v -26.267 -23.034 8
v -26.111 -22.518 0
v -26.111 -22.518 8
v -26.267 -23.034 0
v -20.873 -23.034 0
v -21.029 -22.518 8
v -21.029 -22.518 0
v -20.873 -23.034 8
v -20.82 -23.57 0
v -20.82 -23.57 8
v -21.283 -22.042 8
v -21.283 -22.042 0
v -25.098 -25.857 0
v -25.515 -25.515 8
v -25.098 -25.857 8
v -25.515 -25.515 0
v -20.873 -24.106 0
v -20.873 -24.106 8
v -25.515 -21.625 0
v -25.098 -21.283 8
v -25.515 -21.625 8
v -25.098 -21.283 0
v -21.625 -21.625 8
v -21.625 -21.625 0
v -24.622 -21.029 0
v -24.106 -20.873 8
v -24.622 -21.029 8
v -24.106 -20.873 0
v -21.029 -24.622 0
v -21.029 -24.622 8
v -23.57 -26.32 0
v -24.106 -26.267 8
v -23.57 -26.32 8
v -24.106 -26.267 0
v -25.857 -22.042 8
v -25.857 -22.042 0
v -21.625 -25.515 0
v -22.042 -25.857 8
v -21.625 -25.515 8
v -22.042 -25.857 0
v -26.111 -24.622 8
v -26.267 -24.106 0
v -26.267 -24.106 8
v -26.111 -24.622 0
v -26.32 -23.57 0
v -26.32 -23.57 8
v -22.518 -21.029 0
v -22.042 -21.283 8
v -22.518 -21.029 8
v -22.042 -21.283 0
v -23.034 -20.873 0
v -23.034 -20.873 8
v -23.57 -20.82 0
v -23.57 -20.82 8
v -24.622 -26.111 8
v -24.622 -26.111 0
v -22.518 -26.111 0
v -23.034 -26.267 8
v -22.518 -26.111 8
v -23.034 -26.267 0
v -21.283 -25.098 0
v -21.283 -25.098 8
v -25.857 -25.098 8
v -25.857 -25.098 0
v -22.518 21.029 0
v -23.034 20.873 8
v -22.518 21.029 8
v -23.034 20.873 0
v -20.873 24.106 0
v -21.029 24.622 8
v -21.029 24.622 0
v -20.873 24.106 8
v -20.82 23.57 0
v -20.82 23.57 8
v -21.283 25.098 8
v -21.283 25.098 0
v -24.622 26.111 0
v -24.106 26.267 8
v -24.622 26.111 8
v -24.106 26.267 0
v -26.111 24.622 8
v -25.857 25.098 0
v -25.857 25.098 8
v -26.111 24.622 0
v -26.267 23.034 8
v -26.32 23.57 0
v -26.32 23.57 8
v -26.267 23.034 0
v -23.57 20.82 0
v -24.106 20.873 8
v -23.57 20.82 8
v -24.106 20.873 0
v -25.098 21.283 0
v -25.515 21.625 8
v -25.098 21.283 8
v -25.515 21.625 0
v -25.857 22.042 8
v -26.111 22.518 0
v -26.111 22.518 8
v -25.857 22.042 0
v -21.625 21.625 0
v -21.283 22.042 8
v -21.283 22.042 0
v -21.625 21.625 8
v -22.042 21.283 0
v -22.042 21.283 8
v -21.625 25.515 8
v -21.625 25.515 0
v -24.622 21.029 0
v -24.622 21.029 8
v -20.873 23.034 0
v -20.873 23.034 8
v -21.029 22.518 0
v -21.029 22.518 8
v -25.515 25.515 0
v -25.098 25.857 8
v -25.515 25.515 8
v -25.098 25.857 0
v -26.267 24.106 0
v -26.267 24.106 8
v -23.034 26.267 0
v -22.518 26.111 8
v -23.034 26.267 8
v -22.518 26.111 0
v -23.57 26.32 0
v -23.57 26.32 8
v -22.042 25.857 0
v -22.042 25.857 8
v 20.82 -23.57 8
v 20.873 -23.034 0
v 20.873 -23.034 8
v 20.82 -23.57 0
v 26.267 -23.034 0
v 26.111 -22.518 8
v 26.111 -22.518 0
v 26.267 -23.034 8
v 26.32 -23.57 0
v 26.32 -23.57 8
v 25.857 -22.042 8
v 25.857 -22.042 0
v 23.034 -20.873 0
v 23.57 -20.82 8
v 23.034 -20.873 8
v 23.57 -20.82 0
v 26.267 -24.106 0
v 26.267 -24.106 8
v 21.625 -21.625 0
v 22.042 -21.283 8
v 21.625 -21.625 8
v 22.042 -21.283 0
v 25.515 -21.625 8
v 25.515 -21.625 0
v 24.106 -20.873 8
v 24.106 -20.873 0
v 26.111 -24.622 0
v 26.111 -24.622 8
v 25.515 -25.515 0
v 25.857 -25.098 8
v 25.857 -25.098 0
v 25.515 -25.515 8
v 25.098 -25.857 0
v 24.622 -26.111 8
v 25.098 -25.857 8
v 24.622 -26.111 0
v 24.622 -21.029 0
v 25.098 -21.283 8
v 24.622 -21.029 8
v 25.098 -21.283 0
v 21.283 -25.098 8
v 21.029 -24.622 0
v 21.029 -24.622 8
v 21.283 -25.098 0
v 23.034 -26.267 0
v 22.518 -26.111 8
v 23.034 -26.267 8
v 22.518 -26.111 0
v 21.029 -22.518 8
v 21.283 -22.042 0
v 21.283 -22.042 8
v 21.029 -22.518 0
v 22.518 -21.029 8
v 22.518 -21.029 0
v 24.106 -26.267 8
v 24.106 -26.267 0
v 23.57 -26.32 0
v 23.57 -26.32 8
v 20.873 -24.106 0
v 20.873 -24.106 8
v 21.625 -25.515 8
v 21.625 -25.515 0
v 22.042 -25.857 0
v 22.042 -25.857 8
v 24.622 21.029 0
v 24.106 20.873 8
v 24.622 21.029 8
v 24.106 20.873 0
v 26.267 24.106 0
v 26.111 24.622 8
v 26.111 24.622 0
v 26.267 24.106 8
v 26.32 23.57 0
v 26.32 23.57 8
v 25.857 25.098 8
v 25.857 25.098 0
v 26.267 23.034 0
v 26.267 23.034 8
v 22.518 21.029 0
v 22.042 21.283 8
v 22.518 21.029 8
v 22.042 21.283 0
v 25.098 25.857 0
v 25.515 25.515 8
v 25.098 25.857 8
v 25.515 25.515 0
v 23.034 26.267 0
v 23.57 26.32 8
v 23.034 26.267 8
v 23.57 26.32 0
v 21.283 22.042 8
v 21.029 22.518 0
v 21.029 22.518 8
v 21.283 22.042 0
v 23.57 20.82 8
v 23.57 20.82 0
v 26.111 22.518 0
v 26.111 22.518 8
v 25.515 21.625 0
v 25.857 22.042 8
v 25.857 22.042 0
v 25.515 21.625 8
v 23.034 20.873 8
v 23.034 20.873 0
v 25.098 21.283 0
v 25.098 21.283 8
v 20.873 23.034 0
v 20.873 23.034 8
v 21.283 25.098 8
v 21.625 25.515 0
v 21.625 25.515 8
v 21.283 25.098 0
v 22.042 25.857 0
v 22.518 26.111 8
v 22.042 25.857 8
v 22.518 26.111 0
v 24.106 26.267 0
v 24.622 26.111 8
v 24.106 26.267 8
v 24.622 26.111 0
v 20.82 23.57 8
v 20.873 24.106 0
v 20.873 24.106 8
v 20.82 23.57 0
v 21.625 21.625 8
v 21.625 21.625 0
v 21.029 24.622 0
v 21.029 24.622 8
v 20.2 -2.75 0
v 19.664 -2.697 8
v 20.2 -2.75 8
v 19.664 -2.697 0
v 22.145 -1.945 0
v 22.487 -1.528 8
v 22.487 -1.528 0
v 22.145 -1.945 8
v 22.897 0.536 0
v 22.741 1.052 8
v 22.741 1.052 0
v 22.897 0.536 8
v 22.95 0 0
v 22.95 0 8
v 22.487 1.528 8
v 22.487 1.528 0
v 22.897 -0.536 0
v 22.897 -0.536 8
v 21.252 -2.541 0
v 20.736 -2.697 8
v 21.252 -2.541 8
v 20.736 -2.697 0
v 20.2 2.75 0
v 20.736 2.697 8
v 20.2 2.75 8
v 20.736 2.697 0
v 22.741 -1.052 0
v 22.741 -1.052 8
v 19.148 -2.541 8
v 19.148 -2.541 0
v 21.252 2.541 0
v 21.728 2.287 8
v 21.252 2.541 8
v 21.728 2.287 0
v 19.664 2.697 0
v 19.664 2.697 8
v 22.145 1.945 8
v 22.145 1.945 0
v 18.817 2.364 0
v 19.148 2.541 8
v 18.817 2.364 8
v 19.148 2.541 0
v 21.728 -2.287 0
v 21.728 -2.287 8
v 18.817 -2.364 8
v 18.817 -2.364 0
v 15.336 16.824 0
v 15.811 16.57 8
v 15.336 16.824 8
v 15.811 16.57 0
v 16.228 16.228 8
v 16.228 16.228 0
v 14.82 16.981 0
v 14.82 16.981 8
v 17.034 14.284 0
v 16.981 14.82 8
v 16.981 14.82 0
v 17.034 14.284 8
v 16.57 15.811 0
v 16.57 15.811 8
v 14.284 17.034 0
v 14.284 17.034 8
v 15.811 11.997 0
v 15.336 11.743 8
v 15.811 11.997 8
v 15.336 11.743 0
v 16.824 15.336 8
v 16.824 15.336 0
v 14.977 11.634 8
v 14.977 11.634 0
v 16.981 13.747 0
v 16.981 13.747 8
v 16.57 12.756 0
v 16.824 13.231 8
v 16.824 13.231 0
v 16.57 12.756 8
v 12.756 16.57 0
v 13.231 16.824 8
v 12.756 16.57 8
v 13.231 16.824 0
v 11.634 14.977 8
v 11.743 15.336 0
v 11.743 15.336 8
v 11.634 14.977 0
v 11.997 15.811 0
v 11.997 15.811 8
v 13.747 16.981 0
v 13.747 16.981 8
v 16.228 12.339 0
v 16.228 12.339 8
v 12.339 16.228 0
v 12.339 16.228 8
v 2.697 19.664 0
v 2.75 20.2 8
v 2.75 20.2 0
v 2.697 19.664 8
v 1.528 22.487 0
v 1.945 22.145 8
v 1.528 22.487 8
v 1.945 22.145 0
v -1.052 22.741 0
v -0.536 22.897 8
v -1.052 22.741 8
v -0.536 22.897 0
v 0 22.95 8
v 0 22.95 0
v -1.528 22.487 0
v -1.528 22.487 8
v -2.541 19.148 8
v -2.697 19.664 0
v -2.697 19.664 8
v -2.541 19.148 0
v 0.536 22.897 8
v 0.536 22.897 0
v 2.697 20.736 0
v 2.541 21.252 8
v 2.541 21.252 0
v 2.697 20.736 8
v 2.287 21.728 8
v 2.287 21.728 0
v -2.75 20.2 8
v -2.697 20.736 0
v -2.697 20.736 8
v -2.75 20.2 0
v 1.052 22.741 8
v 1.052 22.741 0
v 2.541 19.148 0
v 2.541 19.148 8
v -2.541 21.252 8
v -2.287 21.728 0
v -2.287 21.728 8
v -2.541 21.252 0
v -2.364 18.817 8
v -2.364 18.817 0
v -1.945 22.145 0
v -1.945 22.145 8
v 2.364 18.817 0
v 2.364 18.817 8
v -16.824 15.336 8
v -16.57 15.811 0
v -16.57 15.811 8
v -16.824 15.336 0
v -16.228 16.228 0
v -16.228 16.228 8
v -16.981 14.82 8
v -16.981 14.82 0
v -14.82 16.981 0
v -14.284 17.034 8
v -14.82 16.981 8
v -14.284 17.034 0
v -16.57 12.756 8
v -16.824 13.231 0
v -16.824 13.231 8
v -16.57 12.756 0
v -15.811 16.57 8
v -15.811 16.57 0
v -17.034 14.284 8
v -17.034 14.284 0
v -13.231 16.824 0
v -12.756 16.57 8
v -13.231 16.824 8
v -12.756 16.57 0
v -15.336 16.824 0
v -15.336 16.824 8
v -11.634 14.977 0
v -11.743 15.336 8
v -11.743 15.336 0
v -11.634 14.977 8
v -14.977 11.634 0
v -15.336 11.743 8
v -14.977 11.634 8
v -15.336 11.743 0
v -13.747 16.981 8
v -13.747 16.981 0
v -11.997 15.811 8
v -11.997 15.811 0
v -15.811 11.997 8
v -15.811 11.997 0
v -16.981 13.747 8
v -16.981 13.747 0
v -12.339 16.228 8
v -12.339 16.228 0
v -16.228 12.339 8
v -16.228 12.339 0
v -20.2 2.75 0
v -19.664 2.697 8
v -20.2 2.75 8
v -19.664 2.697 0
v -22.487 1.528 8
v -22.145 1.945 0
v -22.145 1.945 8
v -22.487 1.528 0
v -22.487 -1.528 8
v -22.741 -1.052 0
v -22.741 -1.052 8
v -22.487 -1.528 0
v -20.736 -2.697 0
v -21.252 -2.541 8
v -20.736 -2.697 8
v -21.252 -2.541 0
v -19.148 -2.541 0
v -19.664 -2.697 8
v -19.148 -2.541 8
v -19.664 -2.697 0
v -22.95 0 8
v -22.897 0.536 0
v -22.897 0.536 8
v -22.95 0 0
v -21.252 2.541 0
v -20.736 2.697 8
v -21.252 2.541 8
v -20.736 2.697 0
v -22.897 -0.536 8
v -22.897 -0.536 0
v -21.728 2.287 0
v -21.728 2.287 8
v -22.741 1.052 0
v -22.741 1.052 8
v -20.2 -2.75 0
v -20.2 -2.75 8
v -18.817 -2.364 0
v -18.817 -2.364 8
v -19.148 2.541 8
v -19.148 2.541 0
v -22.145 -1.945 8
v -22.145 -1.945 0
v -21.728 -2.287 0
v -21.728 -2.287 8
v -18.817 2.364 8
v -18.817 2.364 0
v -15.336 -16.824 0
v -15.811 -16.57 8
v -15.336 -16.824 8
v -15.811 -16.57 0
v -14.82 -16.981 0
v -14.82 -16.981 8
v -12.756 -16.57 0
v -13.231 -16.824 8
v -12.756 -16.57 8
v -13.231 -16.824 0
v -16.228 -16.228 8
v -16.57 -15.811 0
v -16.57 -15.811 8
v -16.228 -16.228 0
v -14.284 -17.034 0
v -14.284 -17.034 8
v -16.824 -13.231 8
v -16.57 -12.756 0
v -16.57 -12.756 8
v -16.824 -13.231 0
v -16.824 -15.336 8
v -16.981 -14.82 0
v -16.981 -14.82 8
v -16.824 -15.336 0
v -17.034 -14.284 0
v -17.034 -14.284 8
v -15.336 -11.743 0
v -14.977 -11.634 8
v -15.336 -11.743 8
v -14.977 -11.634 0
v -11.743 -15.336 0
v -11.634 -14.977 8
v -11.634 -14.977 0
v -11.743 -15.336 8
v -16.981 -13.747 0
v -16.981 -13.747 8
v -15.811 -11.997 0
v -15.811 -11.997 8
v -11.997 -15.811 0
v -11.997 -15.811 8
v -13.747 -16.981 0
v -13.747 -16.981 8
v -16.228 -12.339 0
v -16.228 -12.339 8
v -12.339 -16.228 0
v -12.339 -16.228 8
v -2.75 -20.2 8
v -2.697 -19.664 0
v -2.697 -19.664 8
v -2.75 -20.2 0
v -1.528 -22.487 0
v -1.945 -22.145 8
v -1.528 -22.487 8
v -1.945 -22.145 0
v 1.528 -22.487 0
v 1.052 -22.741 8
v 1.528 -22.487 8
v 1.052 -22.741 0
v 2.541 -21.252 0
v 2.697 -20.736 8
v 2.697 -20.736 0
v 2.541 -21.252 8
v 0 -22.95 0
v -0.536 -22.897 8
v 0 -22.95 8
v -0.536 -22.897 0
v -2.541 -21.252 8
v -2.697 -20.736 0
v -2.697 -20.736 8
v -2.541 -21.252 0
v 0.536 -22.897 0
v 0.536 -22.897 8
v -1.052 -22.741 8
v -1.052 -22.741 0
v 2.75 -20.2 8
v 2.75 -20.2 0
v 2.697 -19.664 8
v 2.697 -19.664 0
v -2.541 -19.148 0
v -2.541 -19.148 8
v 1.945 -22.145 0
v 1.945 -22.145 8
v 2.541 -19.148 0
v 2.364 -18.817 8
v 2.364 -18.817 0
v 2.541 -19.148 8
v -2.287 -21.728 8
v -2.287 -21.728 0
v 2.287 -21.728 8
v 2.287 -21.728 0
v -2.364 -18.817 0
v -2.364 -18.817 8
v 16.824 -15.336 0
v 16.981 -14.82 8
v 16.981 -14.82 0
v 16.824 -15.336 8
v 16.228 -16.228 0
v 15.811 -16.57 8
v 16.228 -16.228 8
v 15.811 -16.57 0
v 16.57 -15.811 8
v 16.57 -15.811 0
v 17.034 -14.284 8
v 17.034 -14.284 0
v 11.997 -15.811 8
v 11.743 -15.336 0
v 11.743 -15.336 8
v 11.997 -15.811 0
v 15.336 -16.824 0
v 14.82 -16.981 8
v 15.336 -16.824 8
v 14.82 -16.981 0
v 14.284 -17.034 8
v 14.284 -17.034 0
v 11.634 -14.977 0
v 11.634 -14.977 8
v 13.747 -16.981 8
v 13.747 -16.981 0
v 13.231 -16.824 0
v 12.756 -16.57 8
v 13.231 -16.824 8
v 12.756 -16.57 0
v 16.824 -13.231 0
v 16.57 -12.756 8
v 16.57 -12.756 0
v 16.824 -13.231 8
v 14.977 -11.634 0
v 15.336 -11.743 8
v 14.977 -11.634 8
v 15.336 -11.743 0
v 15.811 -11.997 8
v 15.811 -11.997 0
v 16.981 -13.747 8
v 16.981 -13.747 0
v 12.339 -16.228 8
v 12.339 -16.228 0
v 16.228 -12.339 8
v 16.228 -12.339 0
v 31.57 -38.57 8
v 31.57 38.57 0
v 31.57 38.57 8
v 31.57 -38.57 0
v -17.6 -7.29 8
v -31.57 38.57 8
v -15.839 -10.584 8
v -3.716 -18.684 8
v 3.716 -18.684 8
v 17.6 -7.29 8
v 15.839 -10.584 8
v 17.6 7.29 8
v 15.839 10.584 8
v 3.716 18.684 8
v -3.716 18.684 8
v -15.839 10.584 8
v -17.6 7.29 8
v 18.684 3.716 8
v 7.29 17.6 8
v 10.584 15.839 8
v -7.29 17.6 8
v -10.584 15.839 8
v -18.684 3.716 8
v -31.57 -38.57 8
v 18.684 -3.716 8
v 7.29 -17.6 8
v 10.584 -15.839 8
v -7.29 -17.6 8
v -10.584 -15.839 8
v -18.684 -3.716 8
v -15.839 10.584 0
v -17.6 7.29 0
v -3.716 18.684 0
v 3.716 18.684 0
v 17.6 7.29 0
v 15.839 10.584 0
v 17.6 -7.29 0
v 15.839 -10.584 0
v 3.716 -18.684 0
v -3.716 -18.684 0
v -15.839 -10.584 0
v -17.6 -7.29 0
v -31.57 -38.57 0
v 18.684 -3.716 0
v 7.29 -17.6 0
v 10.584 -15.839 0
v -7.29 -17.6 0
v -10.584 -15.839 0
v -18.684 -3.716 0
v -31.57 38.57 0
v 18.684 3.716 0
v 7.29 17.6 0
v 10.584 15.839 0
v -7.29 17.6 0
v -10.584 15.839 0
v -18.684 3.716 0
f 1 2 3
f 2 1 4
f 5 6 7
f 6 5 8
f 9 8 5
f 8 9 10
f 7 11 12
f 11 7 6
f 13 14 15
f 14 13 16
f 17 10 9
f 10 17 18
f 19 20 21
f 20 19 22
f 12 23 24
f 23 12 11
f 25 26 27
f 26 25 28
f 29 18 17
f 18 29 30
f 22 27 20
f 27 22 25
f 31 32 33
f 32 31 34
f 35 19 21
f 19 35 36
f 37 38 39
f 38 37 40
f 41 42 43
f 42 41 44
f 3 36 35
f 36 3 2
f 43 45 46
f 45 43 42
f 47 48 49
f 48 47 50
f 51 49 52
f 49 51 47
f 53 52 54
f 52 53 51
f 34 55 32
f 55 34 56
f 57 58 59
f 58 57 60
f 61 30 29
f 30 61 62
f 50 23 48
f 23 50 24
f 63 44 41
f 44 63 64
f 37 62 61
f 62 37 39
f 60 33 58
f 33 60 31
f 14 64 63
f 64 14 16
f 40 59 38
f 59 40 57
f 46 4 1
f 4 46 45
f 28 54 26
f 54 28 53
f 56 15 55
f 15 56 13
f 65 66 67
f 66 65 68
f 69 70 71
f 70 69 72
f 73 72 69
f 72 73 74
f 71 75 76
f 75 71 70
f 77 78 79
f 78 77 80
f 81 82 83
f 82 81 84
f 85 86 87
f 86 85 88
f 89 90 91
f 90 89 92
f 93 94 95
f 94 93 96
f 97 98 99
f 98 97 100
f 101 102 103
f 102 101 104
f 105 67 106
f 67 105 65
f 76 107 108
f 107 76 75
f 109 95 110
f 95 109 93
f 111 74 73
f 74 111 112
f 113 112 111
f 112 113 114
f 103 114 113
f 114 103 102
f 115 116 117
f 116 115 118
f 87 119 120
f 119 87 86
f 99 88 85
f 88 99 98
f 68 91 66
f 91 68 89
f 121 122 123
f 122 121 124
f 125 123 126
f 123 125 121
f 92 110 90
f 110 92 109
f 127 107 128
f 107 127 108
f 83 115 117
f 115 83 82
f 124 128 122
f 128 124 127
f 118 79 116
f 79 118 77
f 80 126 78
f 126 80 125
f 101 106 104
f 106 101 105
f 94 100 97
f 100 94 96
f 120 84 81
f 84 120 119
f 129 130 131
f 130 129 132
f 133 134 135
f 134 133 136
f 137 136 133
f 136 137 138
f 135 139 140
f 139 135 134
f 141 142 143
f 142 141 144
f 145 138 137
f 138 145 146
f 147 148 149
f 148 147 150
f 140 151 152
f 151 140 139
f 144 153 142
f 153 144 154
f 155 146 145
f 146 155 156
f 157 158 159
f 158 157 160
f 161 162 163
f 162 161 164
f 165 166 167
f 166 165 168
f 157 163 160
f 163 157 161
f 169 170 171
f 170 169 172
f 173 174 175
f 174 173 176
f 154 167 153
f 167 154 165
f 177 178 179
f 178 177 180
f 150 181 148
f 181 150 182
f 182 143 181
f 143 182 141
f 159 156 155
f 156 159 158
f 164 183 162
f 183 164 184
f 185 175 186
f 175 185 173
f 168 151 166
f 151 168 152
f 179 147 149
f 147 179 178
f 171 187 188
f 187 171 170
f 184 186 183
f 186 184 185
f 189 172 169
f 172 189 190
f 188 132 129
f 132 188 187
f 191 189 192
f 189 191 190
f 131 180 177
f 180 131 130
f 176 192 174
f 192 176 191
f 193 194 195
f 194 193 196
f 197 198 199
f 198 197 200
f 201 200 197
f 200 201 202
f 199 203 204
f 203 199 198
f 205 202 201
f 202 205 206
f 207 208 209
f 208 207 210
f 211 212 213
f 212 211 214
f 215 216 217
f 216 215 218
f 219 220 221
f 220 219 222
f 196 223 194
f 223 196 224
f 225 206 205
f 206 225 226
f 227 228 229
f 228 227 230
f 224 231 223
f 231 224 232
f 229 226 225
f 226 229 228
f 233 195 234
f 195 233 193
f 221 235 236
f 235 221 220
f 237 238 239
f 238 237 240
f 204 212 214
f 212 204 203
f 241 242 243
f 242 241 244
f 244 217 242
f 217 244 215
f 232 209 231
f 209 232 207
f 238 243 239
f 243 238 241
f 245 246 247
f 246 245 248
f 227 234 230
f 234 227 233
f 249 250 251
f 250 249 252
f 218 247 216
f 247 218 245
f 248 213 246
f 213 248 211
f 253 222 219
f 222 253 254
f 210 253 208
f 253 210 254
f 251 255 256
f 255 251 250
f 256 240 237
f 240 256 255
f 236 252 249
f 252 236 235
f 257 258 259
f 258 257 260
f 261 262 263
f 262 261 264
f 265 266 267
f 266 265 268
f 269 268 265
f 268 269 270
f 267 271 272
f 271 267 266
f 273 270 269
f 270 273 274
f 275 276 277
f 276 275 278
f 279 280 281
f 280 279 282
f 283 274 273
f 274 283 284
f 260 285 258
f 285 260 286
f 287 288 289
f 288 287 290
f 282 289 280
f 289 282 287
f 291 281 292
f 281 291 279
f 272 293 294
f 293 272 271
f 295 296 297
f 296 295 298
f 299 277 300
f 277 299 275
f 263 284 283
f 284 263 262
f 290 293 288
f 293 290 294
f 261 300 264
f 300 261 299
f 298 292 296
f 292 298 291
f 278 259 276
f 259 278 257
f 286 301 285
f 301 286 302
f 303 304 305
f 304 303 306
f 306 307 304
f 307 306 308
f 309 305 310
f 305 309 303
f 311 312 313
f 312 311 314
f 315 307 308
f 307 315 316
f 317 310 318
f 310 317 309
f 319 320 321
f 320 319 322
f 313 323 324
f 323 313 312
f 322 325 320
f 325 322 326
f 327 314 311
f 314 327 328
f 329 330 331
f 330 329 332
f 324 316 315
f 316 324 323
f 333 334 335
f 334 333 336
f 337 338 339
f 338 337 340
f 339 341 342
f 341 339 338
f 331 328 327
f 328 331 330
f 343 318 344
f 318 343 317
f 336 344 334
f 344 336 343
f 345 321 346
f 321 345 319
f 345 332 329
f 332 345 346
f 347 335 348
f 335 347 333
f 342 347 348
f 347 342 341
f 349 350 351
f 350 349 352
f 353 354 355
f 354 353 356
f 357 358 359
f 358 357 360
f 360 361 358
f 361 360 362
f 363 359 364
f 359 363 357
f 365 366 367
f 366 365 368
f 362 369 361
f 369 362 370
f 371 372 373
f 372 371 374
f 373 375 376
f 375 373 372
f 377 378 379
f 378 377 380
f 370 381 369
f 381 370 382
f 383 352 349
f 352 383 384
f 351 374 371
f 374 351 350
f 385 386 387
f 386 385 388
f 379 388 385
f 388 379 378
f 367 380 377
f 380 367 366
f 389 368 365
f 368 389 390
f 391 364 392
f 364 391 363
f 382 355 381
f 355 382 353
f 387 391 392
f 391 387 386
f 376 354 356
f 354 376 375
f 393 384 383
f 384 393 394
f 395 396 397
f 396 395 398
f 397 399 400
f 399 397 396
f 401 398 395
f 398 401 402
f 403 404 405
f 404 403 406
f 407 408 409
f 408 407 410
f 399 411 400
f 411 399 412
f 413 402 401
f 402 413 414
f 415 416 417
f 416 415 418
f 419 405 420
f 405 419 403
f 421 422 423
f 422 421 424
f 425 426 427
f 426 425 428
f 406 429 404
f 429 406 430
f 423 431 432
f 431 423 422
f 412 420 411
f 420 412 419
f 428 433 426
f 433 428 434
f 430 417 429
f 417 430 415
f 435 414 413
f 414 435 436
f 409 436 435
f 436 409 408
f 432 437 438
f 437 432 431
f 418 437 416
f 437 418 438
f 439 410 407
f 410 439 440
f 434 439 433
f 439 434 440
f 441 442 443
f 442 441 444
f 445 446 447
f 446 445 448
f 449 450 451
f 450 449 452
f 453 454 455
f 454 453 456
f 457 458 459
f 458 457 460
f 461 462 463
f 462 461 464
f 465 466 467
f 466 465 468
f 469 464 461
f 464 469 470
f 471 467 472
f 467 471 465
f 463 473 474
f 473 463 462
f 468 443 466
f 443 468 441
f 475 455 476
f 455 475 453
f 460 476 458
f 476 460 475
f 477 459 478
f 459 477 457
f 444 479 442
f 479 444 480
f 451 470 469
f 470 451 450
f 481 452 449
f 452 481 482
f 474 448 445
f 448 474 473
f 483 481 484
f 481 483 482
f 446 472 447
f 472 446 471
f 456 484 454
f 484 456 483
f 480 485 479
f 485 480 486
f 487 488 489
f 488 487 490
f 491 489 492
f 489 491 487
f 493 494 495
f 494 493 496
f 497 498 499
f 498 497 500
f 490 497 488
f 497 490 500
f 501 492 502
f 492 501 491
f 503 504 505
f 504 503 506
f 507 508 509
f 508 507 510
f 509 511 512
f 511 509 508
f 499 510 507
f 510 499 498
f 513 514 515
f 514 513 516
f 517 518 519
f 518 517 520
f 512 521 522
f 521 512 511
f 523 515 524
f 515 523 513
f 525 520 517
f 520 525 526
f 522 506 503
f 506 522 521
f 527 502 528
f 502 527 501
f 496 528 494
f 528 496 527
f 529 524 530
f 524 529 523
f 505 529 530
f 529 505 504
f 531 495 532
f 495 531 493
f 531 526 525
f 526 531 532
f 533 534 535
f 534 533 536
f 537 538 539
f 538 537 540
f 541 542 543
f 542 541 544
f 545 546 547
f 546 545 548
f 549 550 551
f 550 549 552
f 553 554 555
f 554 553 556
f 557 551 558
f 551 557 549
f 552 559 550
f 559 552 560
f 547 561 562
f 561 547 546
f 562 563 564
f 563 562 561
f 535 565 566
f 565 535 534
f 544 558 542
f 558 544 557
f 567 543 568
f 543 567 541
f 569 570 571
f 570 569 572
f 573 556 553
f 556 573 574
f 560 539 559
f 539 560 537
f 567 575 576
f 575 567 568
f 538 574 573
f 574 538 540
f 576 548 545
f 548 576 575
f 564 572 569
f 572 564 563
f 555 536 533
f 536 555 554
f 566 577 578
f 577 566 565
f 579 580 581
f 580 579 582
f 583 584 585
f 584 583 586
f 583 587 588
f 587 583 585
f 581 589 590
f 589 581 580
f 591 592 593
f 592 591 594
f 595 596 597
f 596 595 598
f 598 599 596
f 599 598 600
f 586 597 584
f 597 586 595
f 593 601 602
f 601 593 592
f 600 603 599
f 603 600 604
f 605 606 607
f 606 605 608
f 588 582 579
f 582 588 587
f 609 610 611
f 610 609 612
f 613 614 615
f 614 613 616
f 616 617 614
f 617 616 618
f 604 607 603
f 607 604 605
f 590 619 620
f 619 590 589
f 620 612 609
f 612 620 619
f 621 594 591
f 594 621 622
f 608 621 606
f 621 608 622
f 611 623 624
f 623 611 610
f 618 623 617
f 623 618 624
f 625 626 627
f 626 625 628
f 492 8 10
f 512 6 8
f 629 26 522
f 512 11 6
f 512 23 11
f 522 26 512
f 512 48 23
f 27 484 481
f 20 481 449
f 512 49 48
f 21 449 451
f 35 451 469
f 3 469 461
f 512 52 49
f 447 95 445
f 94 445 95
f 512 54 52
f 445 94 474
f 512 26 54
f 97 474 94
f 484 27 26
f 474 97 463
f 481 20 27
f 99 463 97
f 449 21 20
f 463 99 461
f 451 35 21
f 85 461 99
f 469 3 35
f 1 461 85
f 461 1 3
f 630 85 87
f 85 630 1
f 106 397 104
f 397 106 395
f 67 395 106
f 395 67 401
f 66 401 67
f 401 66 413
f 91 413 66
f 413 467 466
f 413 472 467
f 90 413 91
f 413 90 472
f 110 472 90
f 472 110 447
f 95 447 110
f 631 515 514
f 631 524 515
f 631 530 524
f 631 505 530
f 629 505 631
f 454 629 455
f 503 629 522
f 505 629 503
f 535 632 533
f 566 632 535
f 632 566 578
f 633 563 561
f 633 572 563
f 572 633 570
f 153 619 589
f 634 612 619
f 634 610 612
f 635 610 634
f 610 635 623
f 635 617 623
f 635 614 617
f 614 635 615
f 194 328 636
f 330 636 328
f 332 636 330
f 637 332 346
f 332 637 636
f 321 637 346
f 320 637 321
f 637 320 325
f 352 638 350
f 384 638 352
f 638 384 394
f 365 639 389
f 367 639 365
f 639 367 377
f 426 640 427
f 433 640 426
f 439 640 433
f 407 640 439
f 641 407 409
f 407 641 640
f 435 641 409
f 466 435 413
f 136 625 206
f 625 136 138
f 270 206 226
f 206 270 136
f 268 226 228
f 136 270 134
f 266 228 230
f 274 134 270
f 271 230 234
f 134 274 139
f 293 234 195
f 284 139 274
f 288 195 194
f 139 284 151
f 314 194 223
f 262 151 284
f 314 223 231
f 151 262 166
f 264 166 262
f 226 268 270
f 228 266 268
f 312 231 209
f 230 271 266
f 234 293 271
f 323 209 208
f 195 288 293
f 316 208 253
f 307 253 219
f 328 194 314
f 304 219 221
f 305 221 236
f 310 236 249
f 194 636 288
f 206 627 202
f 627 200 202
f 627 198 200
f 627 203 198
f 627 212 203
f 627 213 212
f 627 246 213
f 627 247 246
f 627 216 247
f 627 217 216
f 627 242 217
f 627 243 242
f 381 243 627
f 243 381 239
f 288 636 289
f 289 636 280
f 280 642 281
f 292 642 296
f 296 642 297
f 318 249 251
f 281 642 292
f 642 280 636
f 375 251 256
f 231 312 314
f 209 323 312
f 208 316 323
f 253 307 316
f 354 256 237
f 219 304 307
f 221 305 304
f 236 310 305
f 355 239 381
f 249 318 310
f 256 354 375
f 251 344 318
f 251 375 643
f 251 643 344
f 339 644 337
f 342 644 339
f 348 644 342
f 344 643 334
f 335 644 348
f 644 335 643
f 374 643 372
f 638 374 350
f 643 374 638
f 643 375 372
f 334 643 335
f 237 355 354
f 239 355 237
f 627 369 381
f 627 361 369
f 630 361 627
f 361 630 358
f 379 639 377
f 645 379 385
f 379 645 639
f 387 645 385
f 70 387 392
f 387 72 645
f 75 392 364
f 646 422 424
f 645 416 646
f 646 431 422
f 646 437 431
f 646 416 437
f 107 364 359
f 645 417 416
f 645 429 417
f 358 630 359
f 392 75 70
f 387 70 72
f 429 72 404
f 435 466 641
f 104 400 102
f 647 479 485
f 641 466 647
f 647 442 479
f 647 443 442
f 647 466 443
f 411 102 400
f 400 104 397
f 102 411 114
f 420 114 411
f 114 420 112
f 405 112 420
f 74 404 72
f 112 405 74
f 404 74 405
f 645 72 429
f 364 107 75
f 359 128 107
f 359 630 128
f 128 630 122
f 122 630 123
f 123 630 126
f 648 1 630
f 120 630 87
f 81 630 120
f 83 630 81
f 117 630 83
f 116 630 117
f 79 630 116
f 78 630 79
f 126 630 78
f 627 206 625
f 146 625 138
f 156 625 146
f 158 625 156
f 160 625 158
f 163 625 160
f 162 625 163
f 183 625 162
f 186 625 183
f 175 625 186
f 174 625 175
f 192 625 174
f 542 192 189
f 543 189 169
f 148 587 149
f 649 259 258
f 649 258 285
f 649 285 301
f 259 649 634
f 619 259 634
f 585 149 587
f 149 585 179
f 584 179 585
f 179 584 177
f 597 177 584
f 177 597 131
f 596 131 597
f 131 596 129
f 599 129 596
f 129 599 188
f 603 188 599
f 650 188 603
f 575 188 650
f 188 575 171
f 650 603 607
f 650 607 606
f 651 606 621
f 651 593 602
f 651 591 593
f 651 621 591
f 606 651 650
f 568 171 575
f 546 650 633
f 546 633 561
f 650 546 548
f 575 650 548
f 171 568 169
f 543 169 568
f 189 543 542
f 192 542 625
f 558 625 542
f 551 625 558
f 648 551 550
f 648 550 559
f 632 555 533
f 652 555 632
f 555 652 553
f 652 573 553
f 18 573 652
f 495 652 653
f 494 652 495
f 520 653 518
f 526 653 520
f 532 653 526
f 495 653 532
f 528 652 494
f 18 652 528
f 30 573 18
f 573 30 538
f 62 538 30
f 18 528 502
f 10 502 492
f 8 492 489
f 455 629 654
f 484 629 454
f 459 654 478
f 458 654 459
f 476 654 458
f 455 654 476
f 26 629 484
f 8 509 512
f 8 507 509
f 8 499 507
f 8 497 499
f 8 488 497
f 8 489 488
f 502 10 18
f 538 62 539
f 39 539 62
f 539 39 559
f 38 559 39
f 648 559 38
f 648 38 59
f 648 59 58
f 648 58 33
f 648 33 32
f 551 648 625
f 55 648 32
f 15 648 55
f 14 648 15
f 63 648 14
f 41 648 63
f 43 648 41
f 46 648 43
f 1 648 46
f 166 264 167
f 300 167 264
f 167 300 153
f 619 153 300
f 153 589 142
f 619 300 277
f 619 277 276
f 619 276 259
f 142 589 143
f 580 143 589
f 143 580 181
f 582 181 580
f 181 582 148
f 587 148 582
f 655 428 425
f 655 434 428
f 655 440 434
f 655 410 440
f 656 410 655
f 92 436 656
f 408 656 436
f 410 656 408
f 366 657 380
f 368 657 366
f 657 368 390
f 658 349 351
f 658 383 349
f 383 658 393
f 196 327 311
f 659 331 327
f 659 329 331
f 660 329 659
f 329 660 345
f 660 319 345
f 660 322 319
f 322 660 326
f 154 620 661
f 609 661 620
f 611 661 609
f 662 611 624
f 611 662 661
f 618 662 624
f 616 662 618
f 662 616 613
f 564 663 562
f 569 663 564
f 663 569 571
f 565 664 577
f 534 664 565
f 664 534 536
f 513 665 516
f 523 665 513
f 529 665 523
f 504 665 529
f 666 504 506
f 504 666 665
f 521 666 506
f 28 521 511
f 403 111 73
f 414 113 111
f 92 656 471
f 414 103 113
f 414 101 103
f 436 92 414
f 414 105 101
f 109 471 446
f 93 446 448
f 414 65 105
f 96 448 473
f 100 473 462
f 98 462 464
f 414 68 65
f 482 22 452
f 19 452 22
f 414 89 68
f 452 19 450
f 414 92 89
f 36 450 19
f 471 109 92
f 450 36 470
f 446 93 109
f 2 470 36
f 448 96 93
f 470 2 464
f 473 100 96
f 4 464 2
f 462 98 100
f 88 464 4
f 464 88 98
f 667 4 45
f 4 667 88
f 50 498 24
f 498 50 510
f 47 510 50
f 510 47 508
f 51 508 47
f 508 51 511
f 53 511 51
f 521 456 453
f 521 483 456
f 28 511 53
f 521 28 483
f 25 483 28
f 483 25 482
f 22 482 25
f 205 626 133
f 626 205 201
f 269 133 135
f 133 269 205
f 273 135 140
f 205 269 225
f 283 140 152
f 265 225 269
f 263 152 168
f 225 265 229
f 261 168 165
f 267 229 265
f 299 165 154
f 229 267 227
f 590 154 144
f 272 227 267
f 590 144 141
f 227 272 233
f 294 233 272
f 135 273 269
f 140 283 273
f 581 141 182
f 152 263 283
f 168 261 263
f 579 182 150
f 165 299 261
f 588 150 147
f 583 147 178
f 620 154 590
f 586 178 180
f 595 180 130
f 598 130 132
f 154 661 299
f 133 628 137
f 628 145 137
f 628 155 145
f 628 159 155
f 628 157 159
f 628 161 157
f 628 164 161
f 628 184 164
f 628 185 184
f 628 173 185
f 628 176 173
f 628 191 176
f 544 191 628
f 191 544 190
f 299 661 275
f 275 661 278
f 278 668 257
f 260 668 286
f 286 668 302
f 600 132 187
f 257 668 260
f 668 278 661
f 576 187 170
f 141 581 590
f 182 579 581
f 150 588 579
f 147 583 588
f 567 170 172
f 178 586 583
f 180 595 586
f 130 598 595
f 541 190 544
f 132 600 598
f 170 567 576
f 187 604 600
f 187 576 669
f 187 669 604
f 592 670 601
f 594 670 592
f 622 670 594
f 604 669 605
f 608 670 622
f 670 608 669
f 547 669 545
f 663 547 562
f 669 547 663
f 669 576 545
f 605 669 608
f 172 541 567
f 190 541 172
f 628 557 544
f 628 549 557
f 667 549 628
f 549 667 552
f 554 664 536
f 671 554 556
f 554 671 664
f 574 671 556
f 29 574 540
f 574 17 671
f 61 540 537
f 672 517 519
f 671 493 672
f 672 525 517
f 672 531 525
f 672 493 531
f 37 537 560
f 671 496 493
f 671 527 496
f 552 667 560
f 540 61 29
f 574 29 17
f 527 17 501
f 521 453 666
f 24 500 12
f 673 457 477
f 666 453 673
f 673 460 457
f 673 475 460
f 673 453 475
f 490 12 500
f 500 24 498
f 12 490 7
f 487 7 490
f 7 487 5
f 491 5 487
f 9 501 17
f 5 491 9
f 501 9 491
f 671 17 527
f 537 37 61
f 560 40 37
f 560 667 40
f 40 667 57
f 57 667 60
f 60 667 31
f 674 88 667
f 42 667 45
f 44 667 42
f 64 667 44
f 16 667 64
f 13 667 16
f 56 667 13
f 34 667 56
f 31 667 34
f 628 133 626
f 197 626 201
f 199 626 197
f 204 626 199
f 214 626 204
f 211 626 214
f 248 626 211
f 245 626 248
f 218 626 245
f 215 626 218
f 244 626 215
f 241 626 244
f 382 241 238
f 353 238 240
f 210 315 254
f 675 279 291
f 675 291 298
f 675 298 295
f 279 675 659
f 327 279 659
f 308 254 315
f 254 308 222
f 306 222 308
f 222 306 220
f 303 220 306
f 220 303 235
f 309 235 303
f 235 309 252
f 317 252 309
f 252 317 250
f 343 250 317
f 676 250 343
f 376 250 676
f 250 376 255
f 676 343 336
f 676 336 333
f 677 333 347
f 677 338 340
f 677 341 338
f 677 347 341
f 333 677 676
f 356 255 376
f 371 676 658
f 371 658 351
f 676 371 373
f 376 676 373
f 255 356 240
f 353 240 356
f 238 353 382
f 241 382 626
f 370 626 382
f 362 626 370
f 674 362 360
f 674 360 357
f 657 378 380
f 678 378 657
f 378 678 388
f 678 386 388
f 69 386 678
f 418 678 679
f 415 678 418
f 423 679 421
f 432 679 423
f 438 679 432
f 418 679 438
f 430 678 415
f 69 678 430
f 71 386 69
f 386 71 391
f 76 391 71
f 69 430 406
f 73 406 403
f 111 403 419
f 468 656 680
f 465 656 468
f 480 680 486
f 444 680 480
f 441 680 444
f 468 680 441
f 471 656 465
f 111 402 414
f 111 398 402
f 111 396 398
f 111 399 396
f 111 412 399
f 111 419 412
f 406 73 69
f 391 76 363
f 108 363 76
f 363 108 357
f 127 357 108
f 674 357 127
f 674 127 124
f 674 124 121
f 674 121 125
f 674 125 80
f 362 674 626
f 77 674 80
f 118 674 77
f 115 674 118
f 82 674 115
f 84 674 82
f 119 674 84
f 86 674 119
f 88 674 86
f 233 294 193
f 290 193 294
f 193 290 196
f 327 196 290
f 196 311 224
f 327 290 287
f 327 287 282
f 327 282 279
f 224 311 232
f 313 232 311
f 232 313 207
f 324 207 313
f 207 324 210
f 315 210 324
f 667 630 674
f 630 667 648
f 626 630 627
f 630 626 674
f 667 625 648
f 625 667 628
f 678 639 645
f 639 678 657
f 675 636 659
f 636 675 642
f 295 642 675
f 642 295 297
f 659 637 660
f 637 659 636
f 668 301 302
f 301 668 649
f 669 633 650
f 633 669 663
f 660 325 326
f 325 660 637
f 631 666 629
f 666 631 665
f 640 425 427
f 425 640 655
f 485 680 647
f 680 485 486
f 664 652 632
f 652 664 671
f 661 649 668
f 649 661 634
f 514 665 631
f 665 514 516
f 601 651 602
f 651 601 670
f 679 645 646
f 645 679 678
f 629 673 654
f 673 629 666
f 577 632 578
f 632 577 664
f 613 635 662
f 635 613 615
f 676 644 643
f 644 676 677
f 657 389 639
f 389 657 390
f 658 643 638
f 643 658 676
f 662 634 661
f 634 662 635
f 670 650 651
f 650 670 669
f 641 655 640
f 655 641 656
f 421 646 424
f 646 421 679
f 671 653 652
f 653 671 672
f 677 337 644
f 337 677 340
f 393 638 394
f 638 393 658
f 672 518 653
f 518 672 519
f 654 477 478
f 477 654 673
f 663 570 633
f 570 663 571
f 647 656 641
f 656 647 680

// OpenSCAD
$fn = 32;

// ----------------------------------------------------------------------
// Motor mount plate: NEMA23, 63.14 x 77.14 x 8 mm
// ----------------------------------------------------------------------

// --- parameters (mm) ---
mount_w = 63.14;          // plate length, X
mount_d = 77.14;          // plate width, Y
mat_t = 8;                // plate thickness
motor_pitch = 47.14;      // NEMA23 bolt spacing
motor_d = 5.5;            // NEMA23 screw clearance
center_bore = 38.1;       // pilot boss bore
second_d = 5.5;           // second fastener hole
bc_r = 20.2;              // second bolt circle radius
bc_n = 8;                 // second bolt circle count

module plate() {
  translate([-mount_w / 2, -mount_d / 2, 0]) cube([mount_w, mount_d, mat_t]);
}

module motor_holes() {
  for (sx = [-1, 1]) for (sy = [-1, 1])
    translate([sx * motor_pitch / 2, sy * motor_pitch / 2, -1])
      cylinder(h = mat_t + 2, d = motor_d);
}

difference() {
  union() {
    plate();
  }
  motor_holes();
  translate([0, 0, -1]) cylinder(h = mat_t + 2, d = center_bore);
  for (i = [0 : bc_n - 1]) rotate([0, 0, i * 360 / bc_n]) translate([bc_r, 0, -1])    cylinder(h = mat_t + 2, d = second_d);
}
